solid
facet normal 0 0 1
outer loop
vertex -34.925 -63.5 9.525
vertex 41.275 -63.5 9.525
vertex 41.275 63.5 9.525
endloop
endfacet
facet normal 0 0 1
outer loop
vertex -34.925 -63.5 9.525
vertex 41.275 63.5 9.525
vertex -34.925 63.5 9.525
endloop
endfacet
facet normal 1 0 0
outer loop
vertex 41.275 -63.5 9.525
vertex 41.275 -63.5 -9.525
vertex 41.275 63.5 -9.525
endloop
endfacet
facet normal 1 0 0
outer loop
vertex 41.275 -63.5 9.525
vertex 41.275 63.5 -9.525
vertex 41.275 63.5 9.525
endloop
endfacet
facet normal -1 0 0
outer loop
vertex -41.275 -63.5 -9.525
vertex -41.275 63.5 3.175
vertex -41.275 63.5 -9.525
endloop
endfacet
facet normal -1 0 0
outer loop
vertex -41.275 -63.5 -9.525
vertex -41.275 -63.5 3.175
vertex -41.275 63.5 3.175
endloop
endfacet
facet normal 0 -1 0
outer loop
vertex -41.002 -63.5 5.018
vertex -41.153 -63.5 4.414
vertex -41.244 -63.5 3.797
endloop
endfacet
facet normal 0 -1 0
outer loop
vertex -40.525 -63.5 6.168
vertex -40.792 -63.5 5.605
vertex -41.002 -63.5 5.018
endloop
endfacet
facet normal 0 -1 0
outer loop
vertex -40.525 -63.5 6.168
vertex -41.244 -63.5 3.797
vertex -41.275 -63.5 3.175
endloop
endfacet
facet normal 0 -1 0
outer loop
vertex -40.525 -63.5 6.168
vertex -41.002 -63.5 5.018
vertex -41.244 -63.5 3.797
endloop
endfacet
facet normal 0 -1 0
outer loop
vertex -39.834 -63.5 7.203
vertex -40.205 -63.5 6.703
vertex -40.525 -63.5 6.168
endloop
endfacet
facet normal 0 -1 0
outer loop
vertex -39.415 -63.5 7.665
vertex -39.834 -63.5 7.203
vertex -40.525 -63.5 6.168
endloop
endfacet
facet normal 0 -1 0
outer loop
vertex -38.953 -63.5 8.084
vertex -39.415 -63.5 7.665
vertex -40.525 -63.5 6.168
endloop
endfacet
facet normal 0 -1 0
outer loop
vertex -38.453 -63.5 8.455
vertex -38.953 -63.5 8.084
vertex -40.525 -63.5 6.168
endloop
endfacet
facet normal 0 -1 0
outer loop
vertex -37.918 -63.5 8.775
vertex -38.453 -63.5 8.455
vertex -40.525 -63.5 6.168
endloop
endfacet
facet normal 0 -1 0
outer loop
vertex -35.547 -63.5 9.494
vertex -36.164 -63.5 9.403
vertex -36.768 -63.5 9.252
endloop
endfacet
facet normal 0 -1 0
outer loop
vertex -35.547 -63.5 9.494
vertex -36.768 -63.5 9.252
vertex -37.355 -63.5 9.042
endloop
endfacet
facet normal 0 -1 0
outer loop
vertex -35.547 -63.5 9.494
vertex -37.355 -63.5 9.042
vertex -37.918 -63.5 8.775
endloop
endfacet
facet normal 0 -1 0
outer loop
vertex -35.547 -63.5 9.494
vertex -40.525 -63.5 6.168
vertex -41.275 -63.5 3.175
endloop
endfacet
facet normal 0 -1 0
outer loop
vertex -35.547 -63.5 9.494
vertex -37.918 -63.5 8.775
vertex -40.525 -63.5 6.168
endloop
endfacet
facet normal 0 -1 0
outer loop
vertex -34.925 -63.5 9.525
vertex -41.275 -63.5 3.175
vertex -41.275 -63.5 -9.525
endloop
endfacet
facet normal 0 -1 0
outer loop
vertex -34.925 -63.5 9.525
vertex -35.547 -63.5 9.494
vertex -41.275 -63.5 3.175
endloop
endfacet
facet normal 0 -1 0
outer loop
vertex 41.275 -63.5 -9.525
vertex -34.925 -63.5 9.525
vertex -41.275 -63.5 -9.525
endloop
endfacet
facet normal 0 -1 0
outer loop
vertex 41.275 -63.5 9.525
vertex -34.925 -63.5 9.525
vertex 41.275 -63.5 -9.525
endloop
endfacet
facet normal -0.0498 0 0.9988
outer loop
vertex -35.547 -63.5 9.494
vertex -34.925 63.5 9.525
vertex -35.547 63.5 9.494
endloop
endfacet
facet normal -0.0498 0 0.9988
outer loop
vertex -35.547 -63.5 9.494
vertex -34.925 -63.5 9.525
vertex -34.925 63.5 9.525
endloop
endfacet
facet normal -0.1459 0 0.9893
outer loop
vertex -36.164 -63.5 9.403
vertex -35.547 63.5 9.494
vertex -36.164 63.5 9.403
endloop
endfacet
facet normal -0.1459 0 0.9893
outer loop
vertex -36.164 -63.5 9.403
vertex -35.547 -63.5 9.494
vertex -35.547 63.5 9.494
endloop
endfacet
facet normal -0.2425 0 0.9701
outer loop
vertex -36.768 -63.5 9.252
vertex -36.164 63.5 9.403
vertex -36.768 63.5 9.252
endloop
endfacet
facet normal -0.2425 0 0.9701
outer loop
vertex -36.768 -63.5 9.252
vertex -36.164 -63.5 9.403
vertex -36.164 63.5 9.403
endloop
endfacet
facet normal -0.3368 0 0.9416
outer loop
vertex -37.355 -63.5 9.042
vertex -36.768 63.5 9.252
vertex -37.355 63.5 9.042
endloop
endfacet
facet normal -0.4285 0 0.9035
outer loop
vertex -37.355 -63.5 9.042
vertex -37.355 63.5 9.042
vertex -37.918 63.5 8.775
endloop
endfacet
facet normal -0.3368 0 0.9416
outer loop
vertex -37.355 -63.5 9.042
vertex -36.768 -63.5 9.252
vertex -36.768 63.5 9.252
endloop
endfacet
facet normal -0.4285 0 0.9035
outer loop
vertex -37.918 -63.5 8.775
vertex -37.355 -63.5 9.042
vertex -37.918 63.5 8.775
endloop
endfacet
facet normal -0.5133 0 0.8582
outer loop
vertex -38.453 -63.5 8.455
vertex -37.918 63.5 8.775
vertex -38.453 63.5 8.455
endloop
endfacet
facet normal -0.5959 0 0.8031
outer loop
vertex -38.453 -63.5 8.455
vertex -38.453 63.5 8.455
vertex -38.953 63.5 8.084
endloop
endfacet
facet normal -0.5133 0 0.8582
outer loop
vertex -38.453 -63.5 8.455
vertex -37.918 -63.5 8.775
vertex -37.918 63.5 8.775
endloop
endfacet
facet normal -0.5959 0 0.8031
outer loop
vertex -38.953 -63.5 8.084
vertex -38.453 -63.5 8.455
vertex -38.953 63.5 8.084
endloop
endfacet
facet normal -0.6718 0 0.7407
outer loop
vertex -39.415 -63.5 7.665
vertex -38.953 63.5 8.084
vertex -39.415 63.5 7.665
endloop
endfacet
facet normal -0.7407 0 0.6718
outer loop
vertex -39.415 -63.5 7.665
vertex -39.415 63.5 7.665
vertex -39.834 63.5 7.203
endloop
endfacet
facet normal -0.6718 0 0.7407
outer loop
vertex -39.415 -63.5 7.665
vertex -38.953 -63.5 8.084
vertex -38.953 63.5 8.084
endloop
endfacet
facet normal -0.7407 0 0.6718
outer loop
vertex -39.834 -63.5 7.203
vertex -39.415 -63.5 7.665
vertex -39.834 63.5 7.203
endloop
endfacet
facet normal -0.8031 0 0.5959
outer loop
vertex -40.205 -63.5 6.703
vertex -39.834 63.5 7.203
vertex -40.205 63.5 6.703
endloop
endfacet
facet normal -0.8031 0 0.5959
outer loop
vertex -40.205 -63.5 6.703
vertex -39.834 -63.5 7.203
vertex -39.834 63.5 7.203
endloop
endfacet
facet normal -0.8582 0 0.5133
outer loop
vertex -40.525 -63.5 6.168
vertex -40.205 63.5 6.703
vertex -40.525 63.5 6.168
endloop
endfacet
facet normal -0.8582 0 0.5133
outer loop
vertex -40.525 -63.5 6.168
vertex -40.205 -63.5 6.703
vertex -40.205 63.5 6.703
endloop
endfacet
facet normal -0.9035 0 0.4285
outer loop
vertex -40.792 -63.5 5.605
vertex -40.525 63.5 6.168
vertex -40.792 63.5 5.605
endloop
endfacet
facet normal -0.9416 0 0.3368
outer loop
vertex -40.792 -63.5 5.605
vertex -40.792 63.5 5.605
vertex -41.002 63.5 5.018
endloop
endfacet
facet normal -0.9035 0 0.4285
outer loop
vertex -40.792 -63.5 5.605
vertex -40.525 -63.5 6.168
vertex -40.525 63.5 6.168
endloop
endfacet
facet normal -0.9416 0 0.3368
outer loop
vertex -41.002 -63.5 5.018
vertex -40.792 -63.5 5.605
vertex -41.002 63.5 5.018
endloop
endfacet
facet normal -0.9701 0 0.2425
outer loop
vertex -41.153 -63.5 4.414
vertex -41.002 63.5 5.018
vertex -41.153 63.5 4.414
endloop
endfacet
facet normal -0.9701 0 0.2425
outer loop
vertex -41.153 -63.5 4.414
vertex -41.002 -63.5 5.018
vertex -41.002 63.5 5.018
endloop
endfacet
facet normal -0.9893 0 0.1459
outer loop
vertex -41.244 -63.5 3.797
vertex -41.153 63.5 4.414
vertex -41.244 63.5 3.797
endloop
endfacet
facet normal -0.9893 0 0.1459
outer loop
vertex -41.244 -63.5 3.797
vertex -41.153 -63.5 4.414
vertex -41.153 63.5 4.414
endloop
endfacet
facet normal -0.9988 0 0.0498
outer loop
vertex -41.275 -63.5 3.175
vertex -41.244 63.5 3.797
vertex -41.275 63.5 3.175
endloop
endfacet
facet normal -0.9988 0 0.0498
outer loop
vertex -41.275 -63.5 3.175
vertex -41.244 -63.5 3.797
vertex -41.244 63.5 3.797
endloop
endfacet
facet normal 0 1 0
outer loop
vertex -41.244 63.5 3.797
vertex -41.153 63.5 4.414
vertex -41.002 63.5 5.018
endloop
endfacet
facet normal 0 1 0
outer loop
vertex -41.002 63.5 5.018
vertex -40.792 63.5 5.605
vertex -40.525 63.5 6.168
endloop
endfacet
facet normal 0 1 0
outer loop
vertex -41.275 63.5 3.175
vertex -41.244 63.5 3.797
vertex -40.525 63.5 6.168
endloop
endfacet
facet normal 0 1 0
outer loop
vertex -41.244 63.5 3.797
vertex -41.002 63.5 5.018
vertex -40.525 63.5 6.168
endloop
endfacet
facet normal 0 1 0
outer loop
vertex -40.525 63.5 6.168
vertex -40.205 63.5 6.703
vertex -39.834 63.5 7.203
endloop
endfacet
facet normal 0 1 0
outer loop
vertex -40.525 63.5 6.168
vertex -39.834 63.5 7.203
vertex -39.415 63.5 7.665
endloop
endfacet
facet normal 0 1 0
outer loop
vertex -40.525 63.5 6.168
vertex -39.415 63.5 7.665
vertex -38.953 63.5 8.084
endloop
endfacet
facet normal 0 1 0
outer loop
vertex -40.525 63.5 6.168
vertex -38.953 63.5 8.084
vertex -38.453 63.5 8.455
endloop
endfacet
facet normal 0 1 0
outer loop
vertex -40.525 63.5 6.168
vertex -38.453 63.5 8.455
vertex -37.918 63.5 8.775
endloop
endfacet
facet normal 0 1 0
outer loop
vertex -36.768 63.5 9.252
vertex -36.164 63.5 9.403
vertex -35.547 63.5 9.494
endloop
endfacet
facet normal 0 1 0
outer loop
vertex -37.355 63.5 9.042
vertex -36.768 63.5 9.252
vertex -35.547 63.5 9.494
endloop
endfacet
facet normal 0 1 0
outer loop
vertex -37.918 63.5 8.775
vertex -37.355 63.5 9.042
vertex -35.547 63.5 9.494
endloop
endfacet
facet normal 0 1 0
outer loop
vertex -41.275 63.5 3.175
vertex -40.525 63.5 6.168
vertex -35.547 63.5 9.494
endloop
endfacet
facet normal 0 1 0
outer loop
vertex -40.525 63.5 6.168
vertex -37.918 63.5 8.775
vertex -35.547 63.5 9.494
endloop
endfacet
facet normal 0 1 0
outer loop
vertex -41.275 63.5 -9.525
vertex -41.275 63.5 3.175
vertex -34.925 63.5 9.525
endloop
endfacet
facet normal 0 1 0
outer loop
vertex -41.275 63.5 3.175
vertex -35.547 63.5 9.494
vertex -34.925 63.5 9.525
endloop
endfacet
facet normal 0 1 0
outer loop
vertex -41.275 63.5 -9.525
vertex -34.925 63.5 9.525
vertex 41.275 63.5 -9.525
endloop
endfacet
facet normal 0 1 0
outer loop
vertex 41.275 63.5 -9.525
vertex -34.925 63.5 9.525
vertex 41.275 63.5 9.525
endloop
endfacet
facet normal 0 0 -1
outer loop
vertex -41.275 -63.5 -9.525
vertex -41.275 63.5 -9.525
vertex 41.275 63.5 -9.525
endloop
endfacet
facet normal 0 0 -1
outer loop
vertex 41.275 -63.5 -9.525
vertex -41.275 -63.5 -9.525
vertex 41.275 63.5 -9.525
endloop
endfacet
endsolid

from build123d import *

# Parameters (mm, degrees)
F1_DEPTH = 63.5


with BuildPart() as f1:
    # F0 (on Front) → F1 (new body, symmetric)
    with BuildSketch(Plane.XZ):
        with BuildLine():
            Line((-41.275, -9.525), (41.275, -9.525))
            Line((41.275, -9.525), (41.275, 9.525))
            Line((41.275, 9.525), (22.504395, 9.525))
            Line((22.504395, 9.525), (-34.925, 9.525))
            ThreePointArc((-34.925, 9.525), (-39.415128, 7.665128), (-41.275, 3.175))
            Line((-41.275, 3.175), (-41.275, -9.525))
        make_face()
    extrude(amount=F1_DEPTH, both=True)


solid = f1.part
